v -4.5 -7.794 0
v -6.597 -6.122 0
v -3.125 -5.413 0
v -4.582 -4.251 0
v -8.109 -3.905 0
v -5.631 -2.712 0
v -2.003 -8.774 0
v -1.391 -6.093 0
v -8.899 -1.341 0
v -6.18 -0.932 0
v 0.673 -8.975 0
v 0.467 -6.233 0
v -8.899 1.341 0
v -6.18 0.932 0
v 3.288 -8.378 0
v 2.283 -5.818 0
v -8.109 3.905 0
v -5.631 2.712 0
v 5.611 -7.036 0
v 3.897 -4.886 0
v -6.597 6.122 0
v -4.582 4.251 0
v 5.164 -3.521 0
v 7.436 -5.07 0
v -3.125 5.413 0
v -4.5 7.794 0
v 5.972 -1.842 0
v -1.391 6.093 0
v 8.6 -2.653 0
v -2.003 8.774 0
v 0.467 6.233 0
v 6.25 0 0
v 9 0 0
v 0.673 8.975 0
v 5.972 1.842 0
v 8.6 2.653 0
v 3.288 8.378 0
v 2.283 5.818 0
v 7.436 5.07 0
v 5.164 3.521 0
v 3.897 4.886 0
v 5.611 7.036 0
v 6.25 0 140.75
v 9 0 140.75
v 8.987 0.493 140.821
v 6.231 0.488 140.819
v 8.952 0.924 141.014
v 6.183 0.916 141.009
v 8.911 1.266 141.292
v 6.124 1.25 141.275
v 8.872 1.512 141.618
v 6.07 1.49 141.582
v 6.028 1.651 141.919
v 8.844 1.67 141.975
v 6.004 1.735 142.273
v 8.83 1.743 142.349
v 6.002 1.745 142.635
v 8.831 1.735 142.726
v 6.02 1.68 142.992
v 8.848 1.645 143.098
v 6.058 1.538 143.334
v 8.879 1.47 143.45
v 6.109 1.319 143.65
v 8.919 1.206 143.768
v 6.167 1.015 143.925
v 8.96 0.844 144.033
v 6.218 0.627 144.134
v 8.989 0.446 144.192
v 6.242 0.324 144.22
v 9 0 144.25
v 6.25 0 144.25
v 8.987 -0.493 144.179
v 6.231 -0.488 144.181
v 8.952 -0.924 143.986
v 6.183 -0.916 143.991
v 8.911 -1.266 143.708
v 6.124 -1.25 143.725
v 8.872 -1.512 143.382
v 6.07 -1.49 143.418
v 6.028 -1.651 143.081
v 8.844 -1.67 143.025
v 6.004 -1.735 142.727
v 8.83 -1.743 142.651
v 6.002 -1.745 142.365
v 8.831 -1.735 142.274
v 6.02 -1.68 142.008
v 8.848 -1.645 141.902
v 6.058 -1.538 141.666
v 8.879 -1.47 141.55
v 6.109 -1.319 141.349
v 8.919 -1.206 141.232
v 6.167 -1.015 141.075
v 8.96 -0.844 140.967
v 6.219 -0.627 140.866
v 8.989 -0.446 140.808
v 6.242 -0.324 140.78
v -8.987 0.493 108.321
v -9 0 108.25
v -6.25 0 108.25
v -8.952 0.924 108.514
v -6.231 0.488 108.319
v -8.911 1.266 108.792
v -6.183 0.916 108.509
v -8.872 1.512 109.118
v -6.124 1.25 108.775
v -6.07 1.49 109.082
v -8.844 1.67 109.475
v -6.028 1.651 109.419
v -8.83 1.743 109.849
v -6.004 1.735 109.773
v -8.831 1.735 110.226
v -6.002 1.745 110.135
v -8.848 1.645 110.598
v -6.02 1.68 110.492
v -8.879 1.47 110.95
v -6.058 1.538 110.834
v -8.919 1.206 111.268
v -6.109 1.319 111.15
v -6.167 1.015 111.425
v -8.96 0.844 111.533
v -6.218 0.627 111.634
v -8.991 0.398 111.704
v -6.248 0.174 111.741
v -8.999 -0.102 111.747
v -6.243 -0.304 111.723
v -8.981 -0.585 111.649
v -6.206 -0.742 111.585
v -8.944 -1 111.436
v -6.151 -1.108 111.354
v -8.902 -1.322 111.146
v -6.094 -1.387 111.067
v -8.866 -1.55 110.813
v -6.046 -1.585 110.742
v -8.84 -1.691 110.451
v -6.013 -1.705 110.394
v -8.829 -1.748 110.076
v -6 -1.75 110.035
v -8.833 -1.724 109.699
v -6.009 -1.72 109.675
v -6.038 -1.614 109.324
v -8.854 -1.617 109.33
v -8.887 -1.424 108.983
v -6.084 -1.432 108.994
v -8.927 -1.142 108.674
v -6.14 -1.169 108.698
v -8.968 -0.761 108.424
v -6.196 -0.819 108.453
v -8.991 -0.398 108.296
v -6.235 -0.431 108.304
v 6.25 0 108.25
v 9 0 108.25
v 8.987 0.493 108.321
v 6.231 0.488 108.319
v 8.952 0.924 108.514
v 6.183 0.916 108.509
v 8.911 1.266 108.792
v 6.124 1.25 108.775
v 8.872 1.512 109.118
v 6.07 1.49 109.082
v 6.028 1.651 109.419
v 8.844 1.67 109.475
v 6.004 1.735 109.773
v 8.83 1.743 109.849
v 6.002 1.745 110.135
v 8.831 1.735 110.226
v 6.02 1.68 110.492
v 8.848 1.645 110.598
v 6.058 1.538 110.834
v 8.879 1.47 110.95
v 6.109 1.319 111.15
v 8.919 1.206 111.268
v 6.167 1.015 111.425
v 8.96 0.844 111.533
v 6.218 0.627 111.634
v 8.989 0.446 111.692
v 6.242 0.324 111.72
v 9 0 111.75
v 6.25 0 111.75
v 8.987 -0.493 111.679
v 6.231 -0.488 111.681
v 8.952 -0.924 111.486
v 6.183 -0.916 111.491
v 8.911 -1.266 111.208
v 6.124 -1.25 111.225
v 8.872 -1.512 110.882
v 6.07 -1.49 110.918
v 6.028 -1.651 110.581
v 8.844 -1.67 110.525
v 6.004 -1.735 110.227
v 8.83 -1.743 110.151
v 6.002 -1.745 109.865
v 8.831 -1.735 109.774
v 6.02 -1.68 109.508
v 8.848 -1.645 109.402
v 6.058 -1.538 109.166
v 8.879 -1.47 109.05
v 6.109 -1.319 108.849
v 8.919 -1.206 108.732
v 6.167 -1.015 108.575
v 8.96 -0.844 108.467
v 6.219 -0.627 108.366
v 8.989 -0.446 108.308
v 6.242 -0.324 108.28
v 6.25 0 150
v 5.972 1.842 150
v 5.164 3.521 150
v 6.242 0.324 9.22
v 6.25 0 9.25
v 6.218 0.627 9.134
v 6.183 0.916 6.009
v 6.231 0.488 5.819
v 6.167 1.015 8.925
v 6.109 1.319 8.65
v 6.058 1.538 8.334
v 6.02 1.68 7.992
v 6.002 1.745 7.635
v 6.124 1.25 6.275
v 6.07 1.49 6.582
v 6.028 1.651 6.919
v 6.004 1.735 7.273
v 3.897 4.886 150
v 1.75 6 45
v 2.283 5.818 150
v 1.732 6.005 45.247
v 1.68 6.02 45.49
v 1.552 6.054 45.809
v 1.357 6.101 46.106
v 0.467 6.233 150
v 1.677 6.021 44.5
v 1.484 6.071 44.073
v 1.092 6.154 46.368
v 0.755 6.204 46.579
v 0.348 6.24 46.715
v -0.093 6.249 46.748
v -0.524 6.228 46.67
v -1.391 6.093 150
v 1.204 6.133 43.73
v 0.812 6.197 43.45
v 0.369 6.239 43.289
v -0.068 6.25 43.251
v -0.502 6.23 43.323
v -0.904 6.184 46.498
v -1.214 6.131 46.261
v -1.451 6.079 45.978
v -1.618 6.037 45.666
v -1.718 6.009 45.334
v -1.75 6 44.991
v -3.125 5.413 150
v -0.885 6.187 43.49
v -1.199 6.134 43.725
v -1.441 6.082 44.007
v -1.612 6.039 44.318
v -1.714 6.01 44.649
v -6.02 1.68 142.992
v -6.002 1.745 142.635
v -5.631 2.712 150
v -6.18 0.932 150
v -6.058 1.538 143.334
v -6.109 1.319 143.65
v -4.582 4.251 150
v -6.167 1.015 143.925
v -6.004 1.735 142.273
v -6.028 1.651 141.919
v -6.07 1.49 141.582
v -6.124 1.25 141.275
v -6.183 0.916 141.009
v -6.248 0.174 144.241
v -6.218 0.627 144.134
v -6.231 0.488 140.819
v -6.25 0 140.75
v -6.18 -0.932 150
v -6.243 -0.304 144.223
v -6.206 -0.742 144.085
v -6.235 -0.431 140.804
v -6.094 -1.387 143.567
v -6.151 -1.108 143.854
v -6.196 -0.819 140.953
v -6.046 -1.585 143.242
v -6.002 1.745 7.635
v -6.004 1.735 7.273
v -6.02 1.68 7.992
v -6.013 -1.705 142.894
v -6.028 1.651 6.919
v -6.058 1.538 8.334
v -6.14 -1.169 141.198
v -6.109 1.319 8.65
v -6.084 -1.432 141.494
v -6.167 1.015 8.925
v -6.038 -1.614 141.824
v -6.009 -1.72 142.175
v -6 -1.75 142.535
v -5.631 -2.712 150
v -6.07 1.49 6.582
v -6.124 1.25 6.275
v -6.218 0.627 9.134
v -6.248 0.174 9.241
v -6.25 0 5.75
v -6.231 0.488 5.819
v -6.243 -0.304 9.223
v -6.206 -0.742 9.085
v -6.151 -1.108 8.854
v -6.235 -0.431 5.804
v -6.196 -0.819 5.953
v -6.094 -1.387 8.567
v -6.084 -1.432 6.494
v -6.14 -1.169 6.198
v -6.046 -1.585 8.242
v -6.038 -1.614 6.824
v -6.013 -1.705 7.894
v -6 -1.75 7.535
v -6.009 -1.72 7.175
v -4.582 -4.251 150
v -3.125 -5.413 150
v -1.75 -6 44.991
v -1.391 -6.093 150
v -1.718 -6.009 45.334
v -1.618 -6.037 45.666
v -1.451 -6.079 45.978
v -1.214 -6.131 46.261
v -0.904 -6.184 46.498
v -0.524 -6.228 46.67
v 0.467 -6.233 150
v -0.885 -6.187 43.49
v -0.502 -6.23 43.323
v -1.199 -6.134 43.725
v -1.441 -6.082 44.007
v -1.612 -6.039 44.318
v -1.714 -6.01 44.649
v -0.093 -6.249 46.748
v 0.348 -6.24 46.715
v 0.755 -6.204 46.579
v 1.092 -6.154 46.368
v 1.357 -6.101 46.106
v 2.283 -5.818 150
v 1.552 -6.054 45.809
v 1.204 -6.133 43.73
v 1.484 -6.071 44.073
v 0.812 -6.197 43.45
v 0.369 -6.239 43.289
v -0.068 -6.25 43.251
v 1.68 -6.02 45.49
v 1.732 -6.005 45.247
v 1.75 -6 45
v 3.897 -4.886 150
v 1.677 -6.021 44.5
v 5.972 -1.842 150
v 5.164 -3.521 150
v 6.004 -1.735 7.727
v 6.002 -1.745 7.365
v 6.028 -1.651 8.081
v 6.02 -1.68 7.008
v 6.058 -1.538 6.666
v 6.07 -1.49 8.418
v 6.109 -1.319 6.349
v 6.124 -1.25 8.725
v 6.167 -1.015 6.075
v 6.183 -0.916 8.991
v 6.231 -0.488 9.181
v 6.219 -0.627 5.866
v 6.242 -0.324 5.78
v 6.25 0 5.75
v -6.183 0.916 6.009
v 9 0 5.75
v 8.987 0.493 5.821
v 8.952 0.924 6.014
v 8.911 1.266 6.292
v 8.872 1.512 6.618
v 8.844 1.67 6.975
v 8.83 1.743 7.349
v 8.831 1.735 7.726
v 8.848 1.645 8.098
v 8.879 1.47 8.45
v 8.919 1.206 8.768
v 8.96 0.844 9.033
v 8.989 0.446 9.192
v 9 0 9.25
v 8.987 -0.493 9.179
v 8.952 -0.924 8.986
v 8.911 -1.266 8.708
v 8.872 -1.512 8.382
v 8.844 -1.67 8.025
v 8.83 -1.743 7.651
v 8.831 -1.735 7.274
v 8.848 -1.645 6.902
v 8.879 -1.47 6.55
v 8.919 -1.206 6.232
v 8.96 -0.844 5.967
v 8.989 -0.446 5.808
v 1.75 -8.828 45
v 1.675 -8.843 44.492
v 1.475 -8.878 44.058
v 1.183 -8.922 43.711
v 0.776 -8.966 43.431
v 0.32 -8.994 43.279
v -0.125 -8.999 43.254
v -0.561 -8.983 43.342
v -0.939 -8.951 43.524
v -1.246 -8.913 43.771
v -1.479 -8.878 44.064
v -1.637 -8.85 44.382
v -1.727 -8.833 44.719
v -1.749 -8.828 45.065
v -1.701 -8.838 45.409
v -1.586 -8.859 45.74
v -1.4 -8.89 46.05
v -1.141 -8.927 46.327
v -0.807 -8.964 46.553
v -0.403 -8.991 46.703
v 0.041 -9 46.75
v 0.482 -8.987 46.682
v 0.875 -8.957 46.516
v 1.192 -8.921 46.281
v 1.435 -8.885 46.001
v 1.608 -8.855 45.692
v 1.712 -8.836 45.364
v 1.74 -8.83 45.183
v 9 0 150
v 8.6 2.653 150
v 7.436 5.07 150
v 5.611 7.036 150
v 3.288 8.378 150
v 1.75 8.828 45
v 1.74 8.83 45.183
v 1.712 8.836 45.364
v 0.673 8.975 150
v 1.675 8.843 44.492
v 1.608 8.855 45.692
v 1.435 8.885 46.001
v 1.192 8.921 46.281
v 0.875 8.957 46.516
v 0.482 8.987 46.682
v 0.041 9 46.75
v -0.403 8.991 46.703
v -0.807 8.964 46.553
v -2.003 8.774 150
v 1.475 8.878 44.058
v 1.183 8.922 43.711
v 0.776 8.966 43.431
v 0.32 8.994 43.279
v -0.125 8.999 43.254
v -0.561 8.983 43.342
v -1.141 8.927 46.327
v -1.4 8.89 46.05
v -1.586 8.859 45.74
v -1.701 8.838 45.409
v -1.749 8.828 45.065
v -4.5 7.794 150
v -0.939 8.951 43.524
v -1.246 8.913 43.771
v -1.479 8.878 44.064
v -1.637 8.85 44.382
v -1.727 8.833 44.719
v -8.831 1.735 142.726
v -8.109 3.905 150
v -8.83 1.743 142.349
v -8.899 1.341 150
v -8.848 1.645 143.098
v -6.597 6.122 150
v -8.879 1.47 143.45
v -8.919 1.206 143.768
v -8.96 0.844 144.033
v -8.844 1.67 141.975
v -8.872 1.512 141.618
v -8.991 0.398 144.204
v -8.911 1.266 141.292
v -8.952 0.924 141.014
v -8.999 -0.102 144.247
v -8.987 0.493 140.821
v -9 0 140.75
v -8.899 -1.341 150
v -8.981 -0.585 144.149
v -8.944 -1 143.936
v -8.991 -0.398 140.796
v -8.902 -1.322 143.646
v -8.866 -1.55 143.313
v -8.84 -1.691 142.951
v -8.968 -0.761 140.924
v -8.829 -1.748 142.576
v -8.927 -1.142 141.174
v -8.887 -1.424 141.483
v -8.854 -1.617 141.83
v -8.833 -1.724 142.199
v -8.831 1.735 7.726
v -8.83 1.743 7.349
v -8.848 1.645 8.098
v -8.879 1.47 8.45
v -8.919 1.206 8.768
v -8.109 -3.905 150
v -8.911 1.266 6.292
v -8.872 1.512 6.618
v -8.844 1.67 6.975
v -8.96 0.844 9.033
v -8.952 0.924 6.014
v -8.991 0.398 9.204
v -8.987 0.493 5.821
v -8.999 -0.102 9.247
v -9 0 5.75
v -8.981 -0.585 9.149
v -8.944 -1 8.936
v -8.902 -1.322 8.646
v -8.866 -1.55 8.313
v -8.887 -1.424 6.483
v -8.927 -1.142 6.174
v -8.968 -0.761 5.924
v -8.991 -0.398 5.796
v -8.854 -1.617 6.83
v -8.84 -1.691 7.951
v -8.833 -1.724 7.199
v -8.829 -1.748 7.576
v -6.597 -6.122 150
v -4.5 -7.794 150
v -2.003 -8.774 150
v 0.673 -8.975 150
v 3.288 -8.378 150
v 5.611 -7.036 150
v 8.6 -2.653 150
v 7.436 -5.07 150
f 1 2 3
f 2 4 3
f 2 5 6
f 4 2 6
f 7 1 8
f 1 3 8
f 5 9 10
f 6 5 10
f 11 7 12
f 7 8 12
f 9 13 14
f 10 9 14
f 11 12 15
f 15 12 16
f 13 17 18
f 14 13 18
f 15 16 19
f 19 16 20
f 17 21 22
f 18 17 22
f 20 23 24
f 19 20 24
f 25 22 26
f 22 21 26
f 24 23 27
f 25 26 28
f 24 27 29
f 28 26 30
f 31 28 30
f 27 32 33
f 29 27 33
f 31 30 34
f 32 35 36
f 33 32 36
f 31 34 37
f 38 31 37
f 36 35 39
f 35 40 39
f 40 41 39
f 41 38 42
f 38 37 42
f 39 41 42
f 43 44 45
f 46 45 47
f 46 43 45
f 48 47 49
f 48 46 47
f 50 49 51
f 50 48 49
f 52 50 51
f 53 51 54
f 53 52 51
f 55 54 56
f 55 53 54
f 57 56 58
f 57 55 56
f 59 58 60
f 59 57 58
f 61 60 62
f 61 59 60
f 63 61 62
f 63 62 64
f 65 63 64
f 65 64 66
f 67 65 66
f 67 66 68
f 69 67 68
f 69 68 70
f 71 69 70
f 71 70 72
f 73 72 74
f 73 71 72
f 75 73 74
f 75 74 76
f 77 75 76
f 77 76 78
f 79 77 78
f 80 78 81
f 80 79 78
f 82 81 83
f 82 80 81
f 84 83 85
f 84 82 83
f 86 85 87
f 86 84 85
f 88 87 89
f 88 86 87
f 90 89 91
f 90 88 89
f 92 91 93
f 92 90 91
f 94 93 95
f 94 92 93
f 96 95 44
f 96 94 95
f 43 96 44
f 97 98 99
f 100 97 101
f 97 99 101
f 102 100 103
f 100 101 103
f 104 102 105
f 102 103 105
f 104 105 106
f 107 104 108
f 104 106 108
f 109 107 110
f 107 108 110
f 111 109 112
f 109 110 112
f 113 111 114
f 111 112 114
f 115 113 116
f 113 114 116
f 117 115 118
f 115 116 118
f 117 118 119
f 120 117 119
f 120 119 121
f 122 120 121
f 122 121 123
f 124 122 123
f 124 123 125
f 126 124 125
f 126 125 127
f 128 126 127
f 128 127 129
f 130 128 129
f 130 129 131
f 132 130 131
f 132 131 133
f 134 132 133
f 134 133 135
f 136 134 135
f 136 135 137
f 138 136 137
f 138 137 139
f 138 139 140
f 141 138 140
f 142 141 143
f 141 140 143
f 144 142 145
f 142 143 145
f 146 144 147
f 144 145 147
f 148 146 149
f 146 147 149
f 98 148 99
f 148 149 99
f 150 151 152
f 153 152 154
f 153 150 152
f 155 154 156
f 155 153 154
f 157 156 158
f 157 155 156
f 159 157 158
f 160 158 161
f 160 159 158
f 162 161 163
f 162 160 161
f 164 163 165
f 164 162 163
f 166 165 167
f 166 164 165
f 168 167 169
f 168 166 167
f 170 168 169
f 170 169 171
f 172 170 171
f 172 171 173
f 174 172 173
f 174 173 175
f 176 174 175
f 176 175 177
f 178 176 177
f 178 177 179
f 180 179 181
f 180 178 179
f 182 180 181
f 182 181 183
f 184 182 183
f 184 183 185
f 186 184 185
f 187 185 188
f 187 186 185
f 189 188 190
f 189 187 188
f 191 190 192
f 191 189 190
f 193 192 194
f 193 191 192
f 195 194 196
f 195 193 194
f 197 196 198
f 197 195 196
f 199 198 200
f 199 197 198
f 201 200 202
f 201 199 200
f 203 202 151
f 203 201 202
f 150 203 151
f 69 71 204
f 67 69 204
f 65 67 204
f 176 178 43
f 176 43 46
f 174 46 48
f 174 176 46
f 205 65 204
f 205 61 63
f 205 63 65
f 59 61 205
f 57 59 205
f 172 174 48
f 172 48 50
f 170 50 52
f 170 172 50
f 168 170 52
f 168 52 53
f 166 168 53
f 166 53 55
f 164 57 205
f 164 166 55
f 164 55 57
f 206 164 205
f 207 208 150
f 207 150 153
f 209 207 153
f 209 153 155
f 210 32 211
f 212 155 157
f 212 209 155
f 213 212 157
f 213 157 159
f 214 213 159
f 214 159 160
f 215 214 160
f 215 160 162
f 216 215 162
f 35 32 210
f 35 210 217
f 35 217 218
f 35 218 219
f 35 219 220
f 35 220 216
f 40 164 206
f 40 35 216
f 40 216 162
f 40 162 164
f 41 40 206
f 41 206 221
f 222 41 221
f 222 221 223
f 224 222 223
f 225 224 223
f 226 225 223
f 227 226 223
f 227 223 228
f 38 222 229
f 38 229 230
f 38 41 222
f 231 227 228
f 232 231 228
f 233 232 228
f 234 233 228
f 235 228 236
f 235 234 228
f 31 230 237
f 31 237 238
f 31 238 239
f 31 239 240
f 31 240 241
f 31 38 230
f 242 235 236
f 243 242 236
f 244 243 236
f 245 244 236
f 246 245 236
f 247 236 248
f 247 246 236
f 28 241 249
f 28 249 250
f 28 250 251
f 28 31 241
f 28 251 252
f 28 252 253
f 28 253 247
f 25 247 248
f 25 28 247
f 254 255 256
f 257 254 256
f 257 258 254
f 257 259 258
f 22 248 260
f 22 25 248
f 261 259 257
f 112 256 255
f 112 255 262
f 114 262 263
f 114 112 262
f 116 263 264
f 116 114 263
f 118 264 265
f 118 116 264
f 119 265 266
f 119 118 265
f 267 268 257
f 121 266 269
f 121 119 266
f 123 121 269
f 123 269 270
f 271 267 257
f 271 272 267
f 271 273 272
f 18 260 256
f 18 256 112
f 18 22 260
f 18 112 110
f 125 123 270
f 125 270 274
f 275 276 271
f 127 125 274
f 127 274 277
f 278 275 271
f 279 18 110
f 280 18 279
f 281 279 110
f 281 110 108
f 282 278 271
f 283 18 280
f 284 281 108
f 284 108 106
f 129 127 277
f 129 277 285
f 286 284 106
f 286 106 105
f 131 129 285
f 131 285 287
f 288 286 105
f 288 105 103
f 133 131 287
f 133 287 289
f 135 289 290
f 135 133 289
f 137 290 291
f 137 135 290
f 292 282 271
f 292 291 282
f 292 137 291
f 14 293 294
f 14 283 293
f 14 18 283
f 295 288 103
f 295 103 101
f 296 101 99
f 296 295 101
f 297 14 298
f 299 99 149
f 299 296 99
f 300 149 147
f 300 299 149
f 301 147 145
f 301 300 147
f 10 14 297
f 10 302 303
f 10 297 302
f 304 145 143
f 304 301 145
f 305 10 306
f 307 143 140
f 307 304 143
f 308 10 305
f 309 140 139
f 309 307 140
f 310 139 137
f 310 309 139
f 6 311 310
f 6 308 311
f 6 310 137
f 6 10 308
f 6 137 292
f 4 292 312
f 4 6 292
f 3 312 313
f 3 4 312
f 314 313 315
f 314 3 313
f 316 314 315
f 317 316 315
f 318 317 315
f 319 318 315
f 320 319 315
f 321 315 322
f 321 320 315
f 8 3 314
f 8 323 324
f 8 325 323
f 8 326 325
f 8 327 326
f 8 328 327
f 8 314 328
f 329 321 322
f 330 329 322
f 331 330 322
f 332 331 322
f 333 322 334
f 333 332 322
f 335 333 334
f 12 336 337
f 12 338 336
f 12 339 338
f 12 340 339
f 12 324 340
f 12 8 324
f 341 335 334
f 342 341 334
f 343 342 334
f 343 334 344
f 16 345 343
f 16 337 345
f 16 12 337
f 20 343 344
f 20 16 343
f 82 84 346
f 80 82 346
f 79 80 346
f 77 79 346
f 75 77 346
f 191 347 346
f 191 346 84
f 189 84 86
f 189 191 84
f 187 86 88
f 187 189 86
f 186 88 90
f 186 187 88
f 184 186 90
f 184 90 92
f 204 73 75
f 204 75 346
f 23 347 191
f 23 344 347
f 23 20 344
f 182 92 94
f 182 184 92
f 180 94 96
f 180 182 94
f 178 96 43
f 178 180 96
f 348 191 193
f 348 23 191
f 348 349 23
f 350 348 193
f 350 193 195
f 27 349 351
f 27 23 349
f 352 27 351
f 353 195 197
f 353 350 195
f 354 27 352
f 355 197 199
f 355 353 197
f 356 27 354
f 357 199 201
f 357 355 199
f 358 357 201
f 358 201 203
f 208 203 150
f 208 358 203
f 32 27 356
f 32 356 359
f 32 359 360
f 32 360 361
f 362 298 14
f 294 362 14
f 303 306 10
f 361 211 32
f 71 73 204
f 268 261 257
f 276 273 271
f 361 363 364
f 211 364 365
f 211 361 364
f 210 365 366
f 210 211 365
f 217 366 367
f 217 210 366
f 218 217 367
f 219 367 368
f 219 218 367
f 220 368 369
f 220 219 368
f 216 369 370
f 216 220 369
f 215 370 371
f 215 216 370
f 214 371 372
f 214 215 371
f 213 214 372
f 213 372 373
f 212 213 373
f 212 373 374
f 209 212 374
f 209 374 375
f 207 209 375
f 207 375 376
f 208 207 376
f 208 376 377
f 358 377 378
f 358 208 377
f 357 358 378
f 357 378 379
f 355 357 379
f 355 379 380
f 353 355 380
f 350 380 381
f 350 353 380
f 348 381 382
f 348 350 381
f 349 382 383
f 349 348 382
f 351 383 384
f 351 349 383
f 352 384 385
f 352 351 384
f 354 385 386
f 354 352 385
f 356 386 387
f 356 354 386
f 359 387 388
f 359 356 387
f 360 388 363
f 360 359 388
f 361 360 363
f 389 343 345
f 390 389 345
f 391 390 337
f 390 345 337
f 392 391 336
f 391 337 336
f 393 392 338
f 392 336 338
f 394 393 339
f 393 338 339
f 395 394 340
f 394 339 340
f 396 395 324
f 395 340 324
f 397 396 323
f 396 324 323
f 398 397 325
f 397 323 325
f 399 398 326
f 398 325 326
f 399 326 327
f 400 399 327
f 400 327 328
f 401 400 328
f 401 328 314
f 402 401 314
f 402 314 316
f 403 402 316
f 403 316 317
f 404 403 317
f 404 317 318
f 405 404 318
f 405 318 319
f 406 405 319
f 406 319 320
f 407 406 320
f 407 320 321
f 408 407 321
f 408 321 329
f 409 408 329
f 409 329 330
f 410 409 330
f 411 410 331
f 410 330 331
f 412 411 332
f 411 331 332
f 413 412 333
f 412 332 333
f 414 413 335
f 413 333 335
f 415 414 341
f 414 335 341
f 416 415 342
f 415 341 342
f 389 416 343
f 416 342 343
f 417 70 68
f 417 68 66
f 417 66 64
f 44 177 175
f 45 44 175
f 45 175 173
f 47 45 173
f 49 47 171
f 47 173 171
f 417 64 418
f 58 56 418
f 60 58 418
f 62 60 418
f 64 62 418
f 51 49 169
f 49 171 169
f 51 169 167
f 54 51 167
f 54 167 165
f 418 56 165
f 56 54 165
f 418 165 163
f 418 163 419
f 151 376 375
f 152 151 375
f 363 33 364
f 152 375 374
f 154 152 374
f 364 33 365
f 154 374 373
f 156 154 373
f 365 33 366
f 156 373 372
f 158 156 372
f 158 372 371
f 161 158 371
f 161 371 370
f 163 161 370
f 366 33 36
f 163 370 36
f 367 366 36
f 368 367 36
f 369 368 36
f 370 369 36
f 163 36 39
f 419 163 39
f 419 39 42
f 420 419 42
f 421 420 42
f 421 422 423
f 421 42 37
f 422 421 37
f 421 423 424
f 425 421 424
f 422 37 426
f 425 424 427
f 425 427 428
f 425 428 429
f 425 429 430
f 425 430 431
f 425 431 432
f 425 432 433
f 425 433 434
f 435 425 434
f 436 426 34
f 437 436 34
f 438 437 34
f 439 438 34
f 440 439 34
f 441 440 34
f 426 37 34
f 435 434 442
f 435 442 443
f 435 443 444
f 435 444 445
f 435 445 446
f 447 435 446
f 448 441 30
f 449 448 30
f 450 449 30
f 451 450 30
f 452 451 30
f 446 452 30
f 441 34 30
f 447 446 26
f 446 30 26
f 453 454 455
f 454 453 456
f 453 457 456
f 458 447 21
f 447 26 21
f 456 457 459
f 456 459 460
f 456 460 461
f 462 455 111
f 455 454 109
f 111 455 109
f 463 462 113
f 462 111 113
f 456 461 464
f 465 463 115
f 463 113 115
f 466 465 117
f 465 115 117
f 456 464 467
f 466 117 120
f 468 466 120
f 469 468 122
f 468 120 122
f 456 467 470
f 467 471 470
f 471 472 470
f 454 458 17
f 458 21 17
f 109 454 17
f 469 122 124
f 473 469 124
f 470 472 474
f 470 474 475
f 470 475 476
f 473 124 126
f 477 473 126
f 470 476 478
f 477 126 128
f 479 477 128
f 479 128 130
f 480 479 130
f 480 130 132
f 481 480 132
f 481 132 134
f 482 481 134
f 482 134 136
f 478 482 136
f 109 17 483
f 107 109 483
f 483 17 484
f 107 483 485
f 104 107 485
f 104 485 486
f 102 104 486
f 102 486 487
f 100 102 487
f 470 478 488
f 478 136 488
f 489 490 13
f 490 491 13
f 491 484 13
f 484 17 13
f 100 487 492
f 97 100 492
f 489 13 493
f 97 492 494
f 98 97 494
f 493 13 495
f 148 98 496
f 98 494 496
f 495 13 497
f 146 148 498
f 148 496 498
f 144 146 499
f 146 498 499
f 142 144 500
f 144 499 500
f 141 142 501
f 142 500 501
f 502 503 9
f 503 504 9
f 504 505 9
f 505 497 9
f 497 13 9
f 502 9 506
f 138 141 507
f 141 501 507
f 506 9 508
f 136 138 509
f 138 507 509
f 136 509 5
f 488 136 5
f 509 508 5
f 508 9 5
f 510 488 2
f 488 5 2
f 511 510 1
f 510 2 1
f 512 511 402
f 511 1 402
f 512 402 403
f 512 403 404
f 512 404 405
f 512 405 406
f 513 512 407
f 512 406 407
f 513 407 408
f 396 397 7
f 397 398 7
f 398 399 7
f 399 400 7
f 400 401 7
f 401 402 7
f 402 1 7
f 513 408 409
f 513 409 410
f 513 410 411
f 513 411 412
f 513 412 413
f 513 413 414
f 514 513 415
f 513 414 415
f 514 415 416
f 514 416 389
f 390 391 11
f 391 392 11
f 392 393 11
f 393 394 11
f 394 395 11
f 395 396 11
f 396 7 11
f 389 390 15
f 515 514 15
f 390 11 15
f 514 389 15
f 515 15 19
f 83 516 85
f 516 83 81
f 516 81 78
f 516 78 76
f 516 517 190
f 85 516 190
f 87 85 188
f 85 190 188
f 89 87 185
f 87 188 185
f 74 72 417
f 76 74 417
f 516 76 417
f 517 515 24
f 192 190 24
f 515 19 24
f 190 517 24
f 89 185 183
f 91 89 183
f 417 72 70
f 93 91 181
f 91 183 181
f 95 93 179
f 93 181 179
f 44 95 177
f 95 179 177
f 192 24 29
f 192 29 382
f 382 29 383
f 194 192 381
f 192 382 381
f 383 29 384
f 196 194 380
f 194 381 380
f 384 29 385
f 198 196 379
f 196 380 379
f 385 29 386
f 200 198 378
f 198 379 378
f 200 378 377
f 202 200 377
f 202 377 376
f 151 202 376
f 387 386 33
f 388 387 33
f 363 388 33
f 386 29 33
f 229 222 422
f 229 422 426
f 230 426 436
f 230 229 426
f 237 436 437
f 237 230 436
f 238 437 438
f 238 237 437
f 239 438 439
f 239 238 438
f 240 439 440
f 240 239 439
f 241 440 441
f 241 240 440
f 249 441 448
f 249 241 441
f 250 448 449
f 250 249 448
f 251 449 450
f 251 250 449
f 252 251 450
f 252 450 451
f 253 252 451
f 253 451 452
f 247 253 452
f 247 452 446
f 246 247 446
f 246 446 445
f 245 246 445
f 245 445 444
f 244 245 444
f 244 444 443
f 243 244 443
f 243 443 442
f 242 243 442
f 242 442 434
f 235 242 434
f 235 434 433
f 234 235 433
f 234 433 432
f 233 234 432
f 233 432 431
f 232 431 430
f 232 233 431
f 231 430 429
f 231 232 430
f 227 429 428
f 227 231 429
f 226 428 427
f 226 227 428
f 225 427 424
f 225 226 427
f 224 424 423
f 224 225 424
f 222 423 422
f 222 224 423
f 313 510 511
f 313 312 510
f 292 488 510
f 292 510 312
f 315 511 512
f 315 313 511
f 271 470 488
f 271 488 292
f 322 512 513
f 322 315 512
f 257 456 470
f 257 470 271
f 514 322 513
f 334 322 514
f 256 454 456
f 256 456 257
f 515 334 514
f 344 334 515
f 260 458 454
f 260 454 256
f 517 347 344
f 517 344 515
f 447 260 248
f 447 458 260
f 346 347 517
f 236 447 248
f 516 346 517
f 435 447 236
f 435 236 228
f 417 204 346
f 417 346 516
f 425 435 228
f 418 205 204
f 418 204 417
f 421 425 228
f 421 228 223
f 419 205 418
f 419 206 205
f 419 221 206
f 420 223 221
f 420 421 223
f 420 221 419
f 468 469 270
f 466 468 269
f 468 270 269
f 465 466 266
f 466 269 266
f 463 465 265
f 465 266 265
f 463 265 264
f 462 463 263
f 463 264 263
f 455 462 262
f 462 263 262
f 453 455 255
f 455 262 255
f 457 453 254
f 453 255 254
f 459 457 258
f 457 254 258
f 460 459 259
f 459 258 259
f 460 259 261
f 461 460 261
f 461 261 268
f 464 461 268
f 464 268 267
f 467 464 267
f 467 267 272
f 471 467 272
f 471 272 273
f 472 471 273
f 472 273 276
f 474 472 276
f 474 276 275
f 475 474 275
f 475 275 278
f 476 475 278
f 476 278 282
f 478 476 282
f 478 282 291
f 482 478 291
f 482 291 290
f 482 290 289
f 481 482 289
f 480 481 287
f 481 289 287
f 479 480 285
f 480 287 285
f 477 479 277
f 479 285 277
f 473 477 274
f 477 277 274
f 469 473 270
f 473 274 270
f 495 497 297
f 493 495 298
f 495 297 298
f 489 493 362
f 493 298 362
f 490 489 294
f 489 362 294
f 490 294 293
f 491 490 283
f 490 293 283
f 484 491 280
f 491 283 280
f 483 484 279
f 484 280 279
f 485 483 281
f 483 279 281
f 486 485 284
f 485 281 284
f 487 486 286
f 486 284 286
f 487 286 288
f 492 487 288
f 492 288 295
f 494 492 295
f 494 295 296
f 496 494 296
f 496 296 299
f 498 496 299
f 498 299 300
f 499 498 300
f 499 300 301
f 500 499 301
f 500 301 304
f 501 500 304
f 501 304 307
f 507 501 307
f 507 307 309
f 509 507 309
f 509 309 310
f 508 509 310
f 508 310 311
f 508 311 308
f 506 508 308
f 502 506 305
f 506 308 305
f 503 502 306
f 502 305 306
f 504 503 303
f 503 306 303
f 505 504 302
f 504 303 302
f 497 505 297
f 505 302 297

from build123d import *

# Parameters (mm, degrees)
SKETCH_1_R               = 9
SKETCH_1_R_2             = 6.25
EXTRUDE_1_DEPTH          = 150
SKETCH_2_R               = 1.75
CUT_EXTRUDE_1_DEPTH      = 10
CUT_EXTRUDE_1_DEPTH_BACK = 10
SKETCH_3_R               = 1.75
CUT_EXTRUDE_2_DEPTH      = 10.0000001
CUT_EXTRUDE_2_DEPTH_BACK = 10.0000001


with BuildPart() as part:
    # ｽｹｯﾁ1 → ﾎﾞｽ - 押し出し1 (new body)
    with BuildSketch(Plane.XY):
        Circle(SKETCH_1_R)
        Circle(SKETCH_1_R_2, mode=Mode.SUBTRACT)
    extrude(amount=EXTRUDE_1_DEPTH)

    # ｽｹｯﾁ2 → ｶｯﾄ - 押し出し1 (cut, two sides)
    with BuildSketch(Plane(origin=(0, 0, 0), x_dir=(0, 0, -1), z_dir=(1, 0, 0))) as cut_extrude_1_sk:
        with Locations((-7.5, 0)):
            Circle(SKETCH_2_R)
        with Locations((-142.5, 0)):
            Circle(SKETCH_2_R)
        with Locations((-110, 0)):
            Circle(SKETCH_2_R)
    extrude(amount=CUT_EXTRUDE_1_DEPTH, mode=Mode.SUBTRACT)
    extrude(cut_extrude_1_sk.sketch, amount=-CUT_EXTRUDE_1_DEPTH_BACK, mode=Mode.SUBTRACT)

    # ｽｹｯﾁ3 → ｶｯﾄ - 押し出し2 (cut, two sides)
    with BuildSketch(Plane(origin=(0, 0, 0), x_dir=(1, 0, 0), z_dir=(0, 1, 0))) as cut_extrude_2_sk:
        with Locations((0, -45)):
            Circle(SKETCH_3_R)
    extrude(amount=CUT_EXTRUDE_2_DEPTH, mode=Mode.SUBTRACT)
    extrude(cut_extrude_2_sk.sketch, amount=-CUT_EXTRUDE_2_DEPTH_BACK, mode=Mode.SUBTRACT)


solid = part.part
